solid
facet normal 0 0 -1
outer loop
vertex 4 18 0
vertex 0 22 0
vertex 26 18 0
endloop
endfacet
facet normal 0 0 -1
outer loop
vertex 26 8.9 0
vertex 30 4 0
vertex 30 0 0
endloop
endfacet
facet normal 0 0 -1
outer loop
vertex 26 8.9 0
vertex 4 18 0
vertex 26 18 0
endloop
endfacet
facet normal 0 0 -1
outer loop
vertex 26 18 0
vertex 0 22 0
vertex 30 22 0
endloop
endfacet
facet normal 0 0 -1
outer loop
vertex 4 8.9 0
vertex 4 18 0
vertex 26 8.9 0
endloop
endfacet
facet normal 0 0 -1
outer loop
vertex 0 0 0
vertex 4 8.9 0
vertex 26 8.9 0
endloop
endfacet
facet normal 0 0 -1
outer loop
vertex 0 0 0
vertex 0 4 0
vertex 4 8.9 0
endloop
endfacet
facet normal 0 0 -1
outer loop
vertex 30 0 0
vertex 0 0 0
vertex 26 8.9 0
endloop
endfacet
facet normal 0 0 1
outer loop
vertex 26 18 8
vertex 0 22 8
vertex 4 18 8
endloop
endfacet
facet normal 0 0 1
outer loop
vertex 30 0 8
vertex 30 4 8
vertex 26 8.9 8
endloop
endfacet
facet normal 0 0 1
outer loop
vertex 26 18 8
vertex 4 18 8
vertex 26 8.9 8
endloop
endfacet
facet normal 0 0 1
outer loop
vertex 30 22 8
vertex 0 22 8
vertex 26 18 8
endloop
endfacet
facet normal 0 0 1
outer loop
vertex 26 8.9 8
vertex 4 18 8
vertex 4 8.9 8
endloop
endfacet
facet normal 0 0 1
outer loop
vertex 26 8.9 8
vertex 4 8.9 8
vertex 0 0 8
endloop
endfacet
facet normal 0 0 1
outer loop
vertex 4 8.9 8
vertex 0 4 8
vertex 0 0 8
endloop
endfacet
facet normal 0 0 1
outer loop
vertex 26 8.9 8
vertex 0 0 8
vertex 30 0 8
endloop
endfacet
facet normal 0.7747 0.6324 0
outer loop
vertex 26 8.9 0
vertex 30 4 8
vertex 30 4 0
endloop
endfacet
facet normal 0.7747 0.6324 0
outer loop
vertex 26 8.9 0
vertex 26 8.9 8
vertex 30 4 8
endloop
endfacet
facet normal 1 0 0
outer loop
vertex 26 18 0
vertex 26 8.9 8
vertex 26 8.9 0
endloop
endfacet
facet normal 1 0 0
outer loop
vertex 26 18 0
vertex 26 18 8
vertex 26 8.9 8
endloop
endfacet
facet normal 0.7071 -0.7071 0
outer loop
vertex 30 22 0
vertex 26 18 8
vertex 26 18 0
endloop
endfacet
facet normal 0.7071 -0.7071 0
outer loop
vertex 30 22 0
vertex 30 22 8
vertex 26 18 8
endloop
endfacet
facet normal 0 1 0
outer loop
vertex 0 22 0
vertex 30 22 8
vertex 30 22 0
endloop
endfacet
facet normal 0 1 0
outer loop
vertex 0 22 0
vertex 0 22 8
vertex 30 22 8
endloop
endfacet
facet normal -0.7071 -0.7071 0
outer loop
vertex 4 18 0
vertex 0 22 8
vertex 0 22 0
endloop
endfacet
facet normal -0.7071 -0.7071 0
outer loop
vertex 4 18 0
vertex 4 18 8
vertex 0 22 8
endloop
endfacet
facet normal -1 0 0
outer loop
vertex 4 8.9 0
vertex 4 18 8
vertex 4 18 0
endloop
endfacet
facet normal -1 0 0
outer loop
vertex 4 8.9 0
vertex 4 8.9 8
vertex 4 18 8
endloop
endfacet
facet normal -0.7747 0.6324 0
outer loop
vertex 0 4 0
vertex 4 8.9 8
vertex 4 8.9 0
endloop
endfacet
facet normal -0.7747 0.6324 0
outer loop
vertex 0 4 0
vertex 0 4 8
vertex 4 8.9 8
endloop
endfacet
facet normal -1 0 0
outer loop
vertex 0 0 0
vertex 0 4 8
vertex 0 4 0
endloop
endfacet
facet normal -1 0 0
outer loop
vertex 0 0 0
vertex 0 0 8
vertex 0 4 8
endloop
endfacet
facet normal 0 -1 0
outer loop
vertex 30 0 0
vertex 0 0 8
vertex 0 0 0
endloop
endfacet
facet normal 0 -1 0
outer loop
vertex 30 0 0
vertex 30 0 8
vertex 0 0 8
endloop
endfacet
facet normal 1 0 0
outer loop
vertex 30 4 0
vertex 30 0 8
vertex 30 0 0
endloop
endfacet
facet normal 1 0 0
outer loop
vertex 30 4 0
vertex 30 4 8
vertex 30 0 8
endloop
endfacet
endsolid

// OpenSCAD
$fn = 32;

// ----------------------------------------------------------------------
// Key bar: dovetail key, 8 mm thick
// ----------------------------------------------------------------------

// --- parameters (mm) ---
profile_height = 8;       // extrusion height
profile_points = 10;      // points of the closed outline

profile = [[0, 0], [30, 0], [30, 4], [26, 8.9], [26, 18], [30, 22], [0, 22], [4, 18], [4, 8.9], [0, 4]];  // single closed polygon, 10 points, counter clockwise

// --- the one profile operation ---
linear_extrude(height = profile_height) polygon(points = profile);
